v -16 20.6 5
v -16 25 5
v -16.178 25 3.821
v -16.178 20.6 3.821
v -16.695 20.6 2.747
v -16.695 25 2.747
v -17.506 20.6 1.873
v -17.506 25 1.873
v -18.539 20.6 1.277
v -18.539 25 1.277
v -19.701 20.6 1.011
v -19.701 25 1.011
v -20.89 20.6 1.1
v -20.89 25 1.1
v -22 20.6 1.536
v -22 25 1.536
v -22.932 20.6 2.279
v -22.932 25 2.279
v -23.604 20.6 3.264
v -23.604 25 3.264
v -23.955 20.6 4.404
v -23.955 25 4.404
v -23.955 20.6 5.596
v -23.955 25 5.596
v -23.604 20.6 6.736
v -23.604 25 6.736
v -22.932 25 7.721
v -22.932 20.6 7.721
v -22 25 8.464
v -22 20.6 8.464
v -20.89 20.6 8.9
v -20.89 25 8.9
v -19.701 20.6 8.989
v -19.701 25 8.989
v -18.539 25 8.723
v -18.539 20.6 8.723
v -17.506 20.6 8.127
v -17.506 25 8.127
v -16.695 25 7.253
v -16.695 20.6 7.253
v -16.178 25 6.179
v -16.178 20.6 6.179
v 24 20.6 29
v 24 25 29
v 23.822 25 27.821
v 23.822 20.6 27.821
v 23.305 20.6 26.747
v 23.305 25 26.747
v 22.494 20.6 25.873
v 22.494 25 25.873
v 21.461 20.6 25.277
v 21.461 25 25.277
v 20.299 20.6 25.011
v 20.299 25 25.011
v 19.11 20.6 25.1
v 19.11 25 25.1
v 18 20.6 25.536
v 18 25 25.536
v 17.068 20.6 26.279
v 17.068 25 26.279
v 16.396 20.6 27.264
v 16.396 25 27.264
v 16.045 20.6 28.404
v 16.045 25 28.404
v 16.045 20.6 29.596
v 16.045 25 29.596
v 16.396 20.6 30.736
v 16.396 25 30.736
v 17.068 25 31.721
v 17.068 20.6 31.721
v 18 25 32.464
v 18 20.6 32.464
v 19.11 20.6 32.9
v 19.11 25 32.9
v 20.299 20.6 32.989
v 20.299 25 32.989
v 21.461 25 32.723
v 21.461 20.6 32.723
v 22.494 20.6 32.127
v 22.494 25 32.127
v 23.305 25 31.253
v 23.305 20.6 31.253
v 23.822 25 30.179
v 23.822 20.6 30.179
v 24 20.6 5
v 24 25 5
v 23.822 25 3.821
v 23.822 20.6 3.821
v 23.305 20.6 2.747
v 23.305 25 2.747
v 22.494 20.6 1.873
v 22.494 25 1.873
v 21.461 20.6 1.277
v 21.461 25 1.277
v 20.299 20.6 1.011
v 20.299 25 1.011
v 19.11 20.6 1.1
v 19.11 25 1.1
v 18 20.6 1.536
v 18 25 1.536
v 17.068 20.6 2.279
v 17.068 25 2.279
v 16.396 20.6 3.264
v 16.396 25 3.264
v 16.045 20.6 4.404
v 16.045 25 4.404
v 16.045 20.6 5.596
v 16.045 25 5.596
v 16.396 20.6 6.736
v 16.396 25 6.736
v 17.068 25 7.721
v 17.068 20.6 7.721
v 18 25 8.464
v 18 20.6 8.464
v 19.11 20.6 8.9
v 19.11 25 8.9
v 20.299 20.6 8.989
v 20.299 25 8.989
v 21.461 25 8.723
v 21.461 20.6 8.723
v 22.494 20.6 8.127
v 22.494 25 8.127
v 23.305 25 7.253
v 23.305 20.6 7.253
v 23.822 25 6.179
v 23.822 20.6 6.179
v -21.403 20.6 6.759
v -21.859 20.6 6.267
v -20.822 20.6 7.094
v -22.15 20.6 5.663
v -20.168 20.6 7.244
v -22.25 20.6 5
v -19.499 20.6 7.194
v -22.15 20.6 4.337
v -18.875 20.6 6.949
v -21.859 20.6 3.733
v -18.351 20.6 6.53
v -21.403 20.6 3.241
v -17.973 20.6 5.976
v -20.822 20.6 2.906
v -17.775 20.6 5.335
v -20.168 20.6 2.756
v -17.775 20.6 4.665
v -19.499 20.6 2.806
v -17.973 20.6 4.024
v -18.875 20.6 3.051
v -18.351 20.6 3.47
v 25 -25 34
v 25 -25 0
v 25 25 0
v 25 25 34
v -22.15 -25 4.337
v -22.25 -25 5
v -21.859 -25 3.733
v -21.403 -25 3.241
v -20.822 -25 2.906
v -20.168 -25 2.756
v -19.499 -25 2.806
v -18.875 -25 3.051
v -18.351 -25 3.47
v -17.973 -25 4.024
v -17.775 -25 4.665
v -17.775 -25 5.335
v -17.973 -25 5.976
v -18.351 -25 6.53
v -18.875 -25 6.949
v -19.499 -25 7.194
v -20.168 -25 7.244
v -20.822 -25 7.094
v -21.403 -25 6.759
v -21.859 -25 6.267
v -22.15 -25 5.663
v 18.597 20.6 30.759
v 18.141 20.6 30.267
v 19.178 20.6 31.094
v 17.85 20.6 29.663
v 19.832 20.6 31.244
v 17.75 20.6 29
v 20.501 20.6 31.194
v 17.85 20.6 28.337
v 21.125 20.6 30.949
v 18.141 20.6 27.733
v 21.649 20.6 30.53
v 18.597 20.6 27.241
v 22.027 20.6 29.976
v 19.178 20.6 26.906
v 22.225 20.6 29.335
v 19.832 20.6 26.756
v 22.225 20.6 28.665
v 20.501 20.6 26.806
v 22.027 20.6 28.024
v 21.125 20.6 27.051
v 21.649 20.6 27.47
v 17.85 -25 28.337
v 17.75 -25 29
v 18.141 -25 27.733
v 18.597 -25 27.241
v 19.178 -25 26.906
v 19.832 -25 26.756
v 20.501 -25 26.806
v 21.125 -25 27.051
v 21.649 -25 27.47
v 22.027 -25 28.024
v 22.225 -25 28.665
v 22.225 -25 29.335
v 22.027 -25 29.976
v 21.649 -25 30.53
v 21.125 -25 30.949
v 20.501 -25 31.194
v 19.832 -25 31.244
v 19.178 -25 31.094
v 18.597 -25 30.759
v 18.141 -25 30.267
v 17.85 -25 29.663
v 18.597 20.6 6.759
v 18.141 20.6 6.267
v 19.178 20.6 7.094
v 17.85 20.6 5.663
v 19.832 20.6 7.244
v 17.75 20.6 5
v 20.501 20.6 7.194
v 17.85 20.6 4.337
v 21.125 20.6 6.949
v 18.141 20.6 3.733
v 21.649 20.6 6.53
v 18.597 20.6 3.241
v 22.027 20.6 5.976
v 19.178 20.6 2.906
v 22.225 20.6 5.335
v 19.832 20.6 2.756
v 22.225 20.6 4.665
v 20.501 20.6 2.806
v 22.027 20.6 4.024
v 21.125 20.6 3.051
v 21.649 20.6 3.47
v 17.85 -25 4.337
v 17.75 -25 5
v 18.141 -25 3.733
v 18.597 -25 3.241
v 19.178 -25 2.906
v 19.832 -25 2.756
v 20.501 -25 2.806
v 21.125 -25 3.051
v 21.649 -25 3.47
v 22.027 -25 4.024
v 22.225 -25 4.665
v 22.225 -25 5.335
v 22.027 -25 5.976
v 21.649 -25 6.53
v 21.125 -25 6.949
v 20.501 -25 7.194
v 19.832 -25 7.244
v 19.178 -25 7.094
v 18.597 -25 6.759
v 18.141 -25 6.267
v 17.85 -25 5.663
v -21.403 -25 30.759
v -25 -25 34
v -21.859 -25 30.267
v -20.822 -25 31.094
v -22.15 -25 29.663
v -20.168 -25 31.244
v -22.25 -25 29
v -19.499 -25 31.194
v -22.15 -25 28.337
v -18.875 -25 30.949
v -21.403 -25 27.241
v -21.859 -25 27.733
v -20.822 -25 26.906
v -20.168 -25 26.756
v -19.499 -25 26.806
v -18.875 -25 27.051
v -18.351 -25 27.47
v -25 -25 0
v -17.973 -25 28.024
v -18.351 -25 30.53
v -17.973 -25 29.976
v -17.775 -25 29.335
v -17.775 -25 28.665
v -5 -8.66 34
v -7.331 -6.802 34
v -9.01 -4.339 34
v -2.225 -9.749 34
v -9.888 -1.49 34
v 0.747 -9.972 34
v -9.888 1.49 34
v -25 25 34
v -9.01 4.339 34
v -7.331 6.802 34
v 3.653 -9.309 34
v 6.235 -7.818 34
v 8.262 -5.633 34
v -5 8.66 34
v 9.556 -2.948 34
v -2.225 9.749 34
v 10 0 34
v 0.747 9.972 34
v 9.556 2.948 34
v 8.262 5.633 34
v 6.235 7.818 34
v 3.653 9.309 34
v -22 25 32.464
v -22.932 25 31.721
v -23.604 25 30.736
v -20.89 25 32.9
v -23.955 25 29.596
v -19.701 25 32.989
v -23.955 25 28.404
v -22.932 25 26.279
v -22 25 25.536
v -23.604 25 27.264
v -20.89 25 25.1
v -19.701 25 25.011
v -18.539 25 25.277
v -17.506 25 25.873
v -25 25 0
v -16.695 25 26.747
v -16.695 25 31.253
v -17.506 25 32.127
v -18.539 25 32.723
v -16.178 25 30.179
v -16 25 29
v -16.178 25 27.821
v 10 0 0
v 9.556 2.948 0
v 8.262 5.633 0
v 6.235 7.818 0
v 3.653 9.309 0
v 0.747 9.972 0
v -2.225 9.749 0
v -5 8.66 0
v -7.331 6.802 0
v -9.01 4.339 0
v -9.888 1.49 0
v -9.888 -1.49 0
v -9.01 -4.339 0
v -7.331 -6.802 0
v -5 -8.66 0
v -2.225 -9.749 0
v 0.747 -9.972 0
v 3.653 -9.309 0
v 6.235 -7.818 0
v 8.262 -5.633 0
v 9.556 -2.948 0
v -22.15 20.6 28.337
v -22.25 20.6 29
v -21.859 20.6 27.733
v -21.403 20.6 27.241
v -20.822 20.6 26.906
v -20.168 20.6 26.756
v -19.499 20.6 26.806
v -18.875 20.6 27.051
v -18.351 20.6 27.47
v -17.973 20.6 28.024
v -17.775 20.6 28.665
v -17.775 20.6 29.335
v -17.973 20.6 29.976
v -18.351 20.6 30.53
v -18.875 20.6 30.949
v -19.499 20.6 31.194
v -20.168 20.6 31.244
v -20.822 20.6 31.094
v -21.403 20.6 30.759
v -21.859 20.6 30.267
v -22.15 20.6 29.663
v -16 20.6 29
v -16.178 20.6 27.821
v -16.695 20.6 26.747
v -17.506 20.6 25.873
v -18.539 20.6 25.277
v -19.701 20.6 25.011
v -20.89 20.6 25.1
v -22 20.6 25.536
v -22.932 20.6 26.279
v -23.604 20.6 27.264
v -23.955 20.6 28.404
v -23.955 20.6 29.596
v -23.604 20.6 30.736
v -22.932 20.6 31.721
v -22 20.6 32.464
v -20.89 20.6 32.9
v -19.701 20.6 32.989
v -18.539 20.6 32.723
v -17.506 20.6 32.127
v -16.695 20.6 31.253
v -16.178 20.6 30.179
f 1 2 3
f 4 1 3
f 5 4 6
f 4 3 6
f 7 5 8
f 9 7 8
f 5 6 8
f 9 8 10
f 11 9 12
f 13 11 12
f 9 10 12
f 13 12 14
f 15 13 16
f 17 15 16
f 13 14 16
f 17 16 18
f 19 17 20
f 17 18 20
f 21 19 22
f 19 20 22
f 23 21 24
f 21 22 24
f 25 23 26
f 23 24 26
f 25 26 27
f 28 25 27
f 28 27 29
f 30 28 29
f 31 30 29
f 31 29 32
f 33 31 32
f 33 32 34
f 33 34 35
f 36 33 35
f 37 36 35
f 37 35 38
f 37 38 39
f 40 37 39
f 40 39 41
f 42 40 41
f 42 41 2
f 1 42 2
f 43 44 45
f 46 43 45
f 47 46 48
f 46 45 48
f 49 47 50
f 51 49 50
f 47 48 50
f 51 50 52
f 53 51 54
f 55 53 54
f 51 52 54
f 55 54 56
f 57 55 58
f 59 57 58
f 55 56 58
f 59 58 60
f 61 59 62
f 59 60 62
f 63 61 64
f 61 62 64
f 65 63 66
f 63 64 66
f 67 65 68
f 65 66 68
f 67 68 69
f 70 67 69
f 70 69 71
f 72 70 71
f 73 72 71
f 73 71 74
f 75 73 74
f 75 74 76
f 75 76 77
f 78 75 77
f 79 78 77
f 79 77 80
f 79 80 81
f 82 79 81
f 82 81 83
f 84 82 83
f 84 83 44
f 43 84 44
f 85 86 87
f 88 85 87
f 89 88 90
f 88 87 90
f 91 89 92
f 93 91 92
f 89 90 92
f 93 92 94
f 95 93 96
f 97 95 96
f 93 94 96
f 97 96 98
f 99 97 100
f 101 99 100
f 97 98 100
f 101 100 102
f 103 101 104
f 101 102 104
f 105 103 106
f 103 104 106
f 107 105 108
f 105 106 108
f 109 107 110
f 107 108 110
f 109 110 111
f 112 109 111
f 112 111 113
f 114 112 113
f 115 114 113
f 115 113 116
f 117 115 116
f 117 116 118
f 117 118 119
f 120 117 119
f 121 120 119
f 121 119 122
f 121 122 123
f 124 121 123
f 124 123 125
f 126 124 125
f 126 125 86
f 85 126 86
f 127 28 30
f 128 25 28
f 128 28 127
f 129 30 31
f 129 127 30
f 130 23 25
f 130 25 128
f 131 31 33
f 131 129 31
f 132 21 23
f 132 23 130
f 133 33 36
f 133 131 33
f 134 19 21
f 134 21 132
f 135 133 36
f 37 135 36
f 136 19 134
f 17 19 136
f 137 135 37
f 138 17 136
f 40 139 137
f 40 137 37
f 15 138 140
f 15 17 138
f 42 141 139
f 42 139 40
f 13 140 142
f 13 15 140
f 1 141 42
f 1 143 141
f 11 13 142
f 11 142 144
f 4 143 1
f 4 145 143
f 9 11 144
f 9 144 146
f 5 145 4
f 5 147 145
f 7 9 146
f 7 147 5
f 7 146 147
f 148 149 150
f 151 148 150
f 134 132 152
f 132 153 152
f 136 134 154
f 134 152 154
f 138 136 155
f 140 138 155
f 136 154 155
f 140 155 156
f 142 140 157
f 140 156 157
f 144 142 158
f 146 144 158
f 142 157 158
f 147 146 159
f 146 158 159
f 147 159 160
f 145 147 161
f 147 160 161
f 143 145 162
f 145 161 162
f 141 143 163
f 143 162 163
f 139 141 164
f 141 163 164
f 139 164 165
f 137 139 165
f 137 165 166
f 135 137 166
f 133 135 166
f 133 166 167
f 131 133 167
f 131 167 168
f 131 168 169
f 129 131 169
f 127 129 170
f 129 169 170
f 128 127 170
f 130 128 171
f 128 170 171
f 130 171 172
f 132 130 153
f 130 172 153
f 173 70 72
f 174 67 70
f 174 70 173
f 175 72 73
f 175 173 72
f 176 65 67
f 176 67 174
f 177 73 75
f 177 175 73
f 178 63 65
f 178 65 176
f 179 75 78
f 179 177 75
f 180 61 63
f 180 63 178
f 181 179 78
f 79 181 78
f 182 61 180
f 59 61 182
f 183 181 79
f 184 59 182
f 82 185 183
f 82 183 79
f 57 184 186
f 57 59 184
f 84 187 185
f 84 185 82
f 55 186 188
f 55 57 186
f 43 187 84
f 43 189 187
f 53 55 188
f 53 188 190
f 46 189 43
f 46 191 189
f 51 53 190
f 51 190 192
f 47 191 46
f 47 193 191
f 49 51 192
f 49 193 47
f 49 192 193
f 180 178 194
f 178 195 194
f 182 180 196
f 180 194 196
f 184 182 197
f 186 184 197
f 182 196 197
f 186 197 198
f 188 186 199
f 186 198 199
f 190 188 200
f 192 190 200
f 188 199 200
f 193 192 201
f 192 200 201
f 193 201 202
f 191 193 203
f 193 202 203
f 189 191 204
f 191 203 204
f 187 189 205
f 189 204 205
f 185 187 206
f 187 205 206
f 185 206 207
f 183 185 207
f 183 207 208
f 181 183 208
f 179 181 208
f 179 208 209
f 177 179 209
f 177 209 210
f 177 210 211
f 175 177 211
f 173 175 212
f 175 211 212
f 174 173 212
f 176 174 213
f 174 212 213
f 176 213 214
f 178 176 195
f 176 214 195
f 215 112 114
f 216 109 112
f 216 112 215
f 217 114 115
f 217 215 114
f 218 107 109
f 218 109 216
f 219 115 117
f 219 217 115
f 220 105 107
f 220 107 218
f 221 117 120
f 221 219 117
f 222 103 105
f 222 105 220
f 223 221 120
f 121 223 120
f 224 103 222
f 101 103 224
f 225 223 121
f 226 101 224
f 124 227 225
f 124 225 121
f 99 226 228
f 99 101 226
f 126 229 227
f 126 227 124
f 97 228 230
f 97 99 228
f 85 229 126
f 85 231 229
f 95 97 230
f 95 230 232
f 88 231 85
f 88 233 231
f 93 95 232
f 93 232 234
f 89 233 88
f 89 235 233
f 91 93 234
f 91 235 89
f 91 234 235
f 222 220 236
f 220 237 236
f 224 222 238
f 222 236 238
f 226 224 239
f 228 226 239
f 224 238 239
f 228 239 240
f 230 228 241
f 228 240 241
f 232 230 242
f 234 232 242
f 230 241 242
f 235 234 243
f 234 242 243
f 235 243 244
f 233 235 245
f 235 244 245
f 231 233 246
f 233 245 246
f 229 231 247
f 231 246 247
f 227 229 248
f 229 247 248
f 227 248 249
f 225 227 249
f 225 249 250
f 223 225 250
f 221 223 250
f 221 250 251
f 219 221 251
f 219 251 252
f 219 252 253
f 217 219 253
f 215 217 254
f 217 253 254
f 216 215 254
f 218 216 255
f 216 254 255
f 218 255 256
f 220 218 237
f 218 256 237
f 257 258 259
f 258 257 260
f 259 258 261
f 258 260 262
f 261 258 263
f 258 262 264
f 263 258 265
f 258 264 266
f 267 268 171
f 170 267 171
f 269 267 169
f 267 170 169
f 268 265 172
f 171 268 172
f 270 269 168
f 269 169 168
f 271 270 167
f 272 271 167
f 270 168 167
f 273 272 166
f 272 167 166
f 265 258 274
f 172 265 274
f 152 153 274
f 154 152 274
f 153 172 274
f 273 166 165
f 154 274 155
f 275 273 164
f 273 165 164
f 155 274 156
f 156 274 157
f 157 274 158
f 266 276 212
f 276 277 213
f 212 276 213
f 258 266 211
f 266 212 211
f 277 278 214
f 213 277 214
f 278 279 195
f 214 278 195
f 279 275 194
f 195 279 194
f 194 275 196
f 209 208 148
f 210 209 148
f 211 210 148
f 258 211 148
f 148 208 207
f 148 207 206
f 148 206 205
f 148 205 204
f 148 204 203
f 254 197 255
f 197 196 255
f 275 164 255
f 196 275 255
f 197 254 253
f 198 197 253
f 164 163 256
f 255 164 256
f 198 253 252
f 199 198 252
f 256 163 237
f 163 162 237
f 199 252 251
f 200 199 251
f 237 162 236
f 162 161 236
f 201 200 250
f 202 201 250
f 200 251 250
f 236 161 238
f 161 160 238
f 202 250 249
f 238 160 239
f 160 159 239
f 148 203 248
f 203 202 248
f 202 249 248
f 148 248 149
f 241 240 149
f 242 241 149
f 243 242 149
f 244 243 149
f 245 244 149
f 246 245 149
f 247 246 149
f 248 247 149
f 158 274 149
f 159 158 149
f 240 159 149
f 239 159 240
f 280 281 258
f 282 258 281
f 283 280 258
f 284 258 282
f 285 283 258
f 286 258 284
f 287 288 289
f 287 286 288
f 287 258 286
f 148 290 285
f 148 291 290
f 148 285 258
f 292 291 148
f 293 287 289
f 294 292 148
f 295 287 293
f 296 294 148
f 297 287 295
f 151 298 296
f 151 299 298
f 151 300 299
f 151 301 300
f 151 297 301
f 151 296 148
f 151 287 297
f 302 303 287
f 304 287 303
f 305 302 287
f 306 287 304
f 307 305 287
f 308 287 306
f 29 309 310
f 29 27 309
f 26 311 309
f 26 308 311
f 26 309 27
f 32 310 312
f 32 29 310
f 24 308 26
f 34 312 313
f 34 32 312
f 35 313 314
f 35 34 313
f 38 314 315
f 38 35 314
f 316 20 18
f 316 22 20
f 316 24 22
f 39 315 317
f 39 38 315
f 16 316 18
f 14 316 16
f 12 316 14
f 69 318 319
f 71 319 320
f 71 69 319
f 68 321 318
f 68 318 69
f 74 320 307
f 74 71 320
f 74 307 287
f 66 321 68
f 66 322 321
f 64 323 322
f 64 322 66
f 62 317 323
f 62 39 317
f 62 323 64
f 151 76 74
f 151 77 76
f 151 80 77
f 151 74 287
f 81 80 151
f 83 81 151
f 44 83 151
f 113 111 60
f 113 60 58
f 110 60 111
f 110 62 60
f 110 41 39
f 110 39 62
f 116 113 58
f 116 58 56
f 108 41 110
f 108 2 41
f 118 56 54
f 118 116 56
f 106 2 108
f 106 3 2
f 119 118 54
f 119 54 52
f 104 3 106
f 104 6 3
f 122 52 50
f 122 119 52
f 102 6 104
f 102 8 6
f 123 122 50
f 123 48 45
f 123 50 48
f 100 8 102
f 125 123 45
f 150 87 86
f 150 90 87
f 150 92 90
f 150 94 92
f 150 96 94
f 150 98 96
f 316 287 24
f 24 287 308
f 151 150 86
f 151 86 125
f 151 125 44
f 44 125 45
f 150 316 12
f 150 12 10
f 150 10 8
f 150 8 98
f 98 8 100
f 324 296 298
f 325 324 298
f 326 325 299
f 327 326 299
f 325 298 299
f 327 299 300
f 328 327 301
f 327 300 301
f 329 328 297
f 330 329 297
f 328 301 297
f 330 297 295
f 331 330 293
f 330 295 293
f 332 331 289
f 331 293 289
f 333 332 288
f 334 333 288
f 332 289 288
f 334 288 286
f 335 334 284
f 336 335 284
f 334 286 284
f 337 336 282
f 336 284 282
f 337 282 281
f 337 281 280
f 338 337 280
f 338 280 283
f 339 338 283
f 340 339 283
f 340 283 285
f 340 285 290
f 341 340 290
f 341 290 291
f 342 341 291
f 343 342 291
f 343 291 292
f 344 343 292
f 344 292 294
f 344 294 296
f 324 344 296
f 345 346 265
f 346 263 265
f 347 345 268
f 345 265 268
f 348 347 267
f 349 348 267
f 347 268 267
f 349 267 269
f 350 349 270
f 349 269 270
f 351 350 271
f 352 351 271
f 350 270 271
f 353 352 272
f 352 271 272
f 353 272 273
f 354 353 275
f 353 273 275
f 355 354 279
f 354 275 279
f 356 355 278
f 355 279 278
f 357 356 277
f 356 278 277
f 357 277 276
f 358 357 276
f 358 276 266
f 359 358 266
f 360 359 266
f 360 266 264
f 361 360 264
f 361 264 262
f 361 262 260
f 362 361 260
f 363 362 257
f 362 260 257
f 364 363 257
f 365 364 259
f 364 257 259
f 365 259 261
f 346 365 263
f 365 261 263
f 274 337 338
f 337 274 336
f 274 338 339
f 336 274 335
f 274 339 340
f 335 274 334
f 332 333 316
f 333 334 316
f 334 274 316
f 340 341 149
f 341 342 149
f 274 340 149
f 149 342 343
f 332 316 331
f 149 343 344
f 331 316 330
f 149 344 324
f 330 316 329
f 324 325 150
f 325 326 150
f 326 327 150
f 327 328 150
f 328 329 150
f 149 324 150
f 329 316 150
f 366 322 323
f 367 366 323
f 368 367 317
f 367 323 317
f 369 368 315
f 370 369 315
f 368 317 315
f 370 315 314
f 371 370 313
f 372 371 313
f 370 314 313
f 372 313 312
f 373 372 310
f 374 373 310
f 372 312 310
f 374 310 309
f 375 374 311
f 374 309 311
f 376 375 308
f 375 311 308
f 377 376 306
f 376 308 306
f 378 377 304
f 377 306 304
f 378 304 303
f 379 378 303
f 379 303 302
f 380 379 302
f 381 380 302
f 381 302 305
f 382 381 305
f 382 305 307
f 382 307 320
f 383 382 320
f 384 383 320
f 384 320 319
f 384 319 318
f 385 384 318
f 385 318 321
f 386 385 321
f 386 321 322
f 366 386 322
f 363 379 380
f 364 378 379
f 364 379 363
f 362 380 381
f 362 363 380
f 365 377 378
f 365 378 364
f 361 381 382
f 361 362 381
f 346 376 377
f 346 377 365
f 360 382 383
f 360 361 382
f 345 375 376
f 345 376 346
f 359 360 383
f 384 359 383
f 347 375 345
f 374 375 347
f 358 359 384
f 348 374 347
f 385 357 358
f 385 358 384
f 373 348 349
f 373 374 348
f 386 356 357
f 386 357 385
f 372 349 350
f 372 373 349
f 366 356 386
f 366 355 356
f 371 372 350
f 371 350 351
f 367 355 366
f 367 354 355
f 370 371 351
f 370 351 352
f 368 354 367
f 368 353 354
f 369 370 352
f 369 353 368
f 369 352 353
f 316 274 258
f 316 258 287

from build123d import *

# Parameters (mm, degrees)
SKETCH1_W                                           = 50
SKETCH1_H                                           = 50
BOSS_EXTRUDE1_DEPTH                                 = 34
CBORE_FOR_M4_HEX_SOCKET_HEAD_CAP_SCREW1_D           = 4.5
CBORE_FOR_M4_HEX_SOCKET_HEAD_CAP_SCREW1_CBORE_D     = 8
CBORE_FOR_M4_HEX_SOCKET_HEAD_CAP_SCREW1_CBORE_DEPTH = 4.4
SKETCH6_R                                           = 10
CUT_EXTRUDE1_DEPTH                                  = 35


with BuildPart() as part:
    # Sketch1 → Boss-Extrude1 (new body)
    with BuildSketch(Plane.XY):
        Rectangle(SKETCH1_W, SKETCH1_H)
    extrude(amount=BOSS_EXTRUDE1_DEPTH)

    # CBORE for M4 Hex Socket Head Cap Screw1 (through all)
    with Locations(Plane(origin=(0, 25, 0), x_dir=(1, 0, 0), z_dir=(0, 1, 0))):
        with Locations((-20, -5), (20, -5), (20, -29), (-20, -29)):
            CounterBoreHole(CBORE_FOR_M4_HEX_SOCKET_HEAD_CAP_SCREW1_D / 2, CBORE_FOR_M4_HEX_SOCKET_HEAD_CAP_SCREW1_CBORE_D / 2, CBORE_FOR_M4_HEX_SOCKET_HEAD_CAP_SCREW1_CBORE_DEPTH)

    # Sketch6 → Cut-Extrude1 (cut, through all)
    with BuildSketch(Plane.XY.offset(34)):
        Circle(SKETCH6_R)
    extrude(amount=-CUT_EXTRUDE1_DEPTH, mode=Mode.SUBTRACT)


solid = part.part
